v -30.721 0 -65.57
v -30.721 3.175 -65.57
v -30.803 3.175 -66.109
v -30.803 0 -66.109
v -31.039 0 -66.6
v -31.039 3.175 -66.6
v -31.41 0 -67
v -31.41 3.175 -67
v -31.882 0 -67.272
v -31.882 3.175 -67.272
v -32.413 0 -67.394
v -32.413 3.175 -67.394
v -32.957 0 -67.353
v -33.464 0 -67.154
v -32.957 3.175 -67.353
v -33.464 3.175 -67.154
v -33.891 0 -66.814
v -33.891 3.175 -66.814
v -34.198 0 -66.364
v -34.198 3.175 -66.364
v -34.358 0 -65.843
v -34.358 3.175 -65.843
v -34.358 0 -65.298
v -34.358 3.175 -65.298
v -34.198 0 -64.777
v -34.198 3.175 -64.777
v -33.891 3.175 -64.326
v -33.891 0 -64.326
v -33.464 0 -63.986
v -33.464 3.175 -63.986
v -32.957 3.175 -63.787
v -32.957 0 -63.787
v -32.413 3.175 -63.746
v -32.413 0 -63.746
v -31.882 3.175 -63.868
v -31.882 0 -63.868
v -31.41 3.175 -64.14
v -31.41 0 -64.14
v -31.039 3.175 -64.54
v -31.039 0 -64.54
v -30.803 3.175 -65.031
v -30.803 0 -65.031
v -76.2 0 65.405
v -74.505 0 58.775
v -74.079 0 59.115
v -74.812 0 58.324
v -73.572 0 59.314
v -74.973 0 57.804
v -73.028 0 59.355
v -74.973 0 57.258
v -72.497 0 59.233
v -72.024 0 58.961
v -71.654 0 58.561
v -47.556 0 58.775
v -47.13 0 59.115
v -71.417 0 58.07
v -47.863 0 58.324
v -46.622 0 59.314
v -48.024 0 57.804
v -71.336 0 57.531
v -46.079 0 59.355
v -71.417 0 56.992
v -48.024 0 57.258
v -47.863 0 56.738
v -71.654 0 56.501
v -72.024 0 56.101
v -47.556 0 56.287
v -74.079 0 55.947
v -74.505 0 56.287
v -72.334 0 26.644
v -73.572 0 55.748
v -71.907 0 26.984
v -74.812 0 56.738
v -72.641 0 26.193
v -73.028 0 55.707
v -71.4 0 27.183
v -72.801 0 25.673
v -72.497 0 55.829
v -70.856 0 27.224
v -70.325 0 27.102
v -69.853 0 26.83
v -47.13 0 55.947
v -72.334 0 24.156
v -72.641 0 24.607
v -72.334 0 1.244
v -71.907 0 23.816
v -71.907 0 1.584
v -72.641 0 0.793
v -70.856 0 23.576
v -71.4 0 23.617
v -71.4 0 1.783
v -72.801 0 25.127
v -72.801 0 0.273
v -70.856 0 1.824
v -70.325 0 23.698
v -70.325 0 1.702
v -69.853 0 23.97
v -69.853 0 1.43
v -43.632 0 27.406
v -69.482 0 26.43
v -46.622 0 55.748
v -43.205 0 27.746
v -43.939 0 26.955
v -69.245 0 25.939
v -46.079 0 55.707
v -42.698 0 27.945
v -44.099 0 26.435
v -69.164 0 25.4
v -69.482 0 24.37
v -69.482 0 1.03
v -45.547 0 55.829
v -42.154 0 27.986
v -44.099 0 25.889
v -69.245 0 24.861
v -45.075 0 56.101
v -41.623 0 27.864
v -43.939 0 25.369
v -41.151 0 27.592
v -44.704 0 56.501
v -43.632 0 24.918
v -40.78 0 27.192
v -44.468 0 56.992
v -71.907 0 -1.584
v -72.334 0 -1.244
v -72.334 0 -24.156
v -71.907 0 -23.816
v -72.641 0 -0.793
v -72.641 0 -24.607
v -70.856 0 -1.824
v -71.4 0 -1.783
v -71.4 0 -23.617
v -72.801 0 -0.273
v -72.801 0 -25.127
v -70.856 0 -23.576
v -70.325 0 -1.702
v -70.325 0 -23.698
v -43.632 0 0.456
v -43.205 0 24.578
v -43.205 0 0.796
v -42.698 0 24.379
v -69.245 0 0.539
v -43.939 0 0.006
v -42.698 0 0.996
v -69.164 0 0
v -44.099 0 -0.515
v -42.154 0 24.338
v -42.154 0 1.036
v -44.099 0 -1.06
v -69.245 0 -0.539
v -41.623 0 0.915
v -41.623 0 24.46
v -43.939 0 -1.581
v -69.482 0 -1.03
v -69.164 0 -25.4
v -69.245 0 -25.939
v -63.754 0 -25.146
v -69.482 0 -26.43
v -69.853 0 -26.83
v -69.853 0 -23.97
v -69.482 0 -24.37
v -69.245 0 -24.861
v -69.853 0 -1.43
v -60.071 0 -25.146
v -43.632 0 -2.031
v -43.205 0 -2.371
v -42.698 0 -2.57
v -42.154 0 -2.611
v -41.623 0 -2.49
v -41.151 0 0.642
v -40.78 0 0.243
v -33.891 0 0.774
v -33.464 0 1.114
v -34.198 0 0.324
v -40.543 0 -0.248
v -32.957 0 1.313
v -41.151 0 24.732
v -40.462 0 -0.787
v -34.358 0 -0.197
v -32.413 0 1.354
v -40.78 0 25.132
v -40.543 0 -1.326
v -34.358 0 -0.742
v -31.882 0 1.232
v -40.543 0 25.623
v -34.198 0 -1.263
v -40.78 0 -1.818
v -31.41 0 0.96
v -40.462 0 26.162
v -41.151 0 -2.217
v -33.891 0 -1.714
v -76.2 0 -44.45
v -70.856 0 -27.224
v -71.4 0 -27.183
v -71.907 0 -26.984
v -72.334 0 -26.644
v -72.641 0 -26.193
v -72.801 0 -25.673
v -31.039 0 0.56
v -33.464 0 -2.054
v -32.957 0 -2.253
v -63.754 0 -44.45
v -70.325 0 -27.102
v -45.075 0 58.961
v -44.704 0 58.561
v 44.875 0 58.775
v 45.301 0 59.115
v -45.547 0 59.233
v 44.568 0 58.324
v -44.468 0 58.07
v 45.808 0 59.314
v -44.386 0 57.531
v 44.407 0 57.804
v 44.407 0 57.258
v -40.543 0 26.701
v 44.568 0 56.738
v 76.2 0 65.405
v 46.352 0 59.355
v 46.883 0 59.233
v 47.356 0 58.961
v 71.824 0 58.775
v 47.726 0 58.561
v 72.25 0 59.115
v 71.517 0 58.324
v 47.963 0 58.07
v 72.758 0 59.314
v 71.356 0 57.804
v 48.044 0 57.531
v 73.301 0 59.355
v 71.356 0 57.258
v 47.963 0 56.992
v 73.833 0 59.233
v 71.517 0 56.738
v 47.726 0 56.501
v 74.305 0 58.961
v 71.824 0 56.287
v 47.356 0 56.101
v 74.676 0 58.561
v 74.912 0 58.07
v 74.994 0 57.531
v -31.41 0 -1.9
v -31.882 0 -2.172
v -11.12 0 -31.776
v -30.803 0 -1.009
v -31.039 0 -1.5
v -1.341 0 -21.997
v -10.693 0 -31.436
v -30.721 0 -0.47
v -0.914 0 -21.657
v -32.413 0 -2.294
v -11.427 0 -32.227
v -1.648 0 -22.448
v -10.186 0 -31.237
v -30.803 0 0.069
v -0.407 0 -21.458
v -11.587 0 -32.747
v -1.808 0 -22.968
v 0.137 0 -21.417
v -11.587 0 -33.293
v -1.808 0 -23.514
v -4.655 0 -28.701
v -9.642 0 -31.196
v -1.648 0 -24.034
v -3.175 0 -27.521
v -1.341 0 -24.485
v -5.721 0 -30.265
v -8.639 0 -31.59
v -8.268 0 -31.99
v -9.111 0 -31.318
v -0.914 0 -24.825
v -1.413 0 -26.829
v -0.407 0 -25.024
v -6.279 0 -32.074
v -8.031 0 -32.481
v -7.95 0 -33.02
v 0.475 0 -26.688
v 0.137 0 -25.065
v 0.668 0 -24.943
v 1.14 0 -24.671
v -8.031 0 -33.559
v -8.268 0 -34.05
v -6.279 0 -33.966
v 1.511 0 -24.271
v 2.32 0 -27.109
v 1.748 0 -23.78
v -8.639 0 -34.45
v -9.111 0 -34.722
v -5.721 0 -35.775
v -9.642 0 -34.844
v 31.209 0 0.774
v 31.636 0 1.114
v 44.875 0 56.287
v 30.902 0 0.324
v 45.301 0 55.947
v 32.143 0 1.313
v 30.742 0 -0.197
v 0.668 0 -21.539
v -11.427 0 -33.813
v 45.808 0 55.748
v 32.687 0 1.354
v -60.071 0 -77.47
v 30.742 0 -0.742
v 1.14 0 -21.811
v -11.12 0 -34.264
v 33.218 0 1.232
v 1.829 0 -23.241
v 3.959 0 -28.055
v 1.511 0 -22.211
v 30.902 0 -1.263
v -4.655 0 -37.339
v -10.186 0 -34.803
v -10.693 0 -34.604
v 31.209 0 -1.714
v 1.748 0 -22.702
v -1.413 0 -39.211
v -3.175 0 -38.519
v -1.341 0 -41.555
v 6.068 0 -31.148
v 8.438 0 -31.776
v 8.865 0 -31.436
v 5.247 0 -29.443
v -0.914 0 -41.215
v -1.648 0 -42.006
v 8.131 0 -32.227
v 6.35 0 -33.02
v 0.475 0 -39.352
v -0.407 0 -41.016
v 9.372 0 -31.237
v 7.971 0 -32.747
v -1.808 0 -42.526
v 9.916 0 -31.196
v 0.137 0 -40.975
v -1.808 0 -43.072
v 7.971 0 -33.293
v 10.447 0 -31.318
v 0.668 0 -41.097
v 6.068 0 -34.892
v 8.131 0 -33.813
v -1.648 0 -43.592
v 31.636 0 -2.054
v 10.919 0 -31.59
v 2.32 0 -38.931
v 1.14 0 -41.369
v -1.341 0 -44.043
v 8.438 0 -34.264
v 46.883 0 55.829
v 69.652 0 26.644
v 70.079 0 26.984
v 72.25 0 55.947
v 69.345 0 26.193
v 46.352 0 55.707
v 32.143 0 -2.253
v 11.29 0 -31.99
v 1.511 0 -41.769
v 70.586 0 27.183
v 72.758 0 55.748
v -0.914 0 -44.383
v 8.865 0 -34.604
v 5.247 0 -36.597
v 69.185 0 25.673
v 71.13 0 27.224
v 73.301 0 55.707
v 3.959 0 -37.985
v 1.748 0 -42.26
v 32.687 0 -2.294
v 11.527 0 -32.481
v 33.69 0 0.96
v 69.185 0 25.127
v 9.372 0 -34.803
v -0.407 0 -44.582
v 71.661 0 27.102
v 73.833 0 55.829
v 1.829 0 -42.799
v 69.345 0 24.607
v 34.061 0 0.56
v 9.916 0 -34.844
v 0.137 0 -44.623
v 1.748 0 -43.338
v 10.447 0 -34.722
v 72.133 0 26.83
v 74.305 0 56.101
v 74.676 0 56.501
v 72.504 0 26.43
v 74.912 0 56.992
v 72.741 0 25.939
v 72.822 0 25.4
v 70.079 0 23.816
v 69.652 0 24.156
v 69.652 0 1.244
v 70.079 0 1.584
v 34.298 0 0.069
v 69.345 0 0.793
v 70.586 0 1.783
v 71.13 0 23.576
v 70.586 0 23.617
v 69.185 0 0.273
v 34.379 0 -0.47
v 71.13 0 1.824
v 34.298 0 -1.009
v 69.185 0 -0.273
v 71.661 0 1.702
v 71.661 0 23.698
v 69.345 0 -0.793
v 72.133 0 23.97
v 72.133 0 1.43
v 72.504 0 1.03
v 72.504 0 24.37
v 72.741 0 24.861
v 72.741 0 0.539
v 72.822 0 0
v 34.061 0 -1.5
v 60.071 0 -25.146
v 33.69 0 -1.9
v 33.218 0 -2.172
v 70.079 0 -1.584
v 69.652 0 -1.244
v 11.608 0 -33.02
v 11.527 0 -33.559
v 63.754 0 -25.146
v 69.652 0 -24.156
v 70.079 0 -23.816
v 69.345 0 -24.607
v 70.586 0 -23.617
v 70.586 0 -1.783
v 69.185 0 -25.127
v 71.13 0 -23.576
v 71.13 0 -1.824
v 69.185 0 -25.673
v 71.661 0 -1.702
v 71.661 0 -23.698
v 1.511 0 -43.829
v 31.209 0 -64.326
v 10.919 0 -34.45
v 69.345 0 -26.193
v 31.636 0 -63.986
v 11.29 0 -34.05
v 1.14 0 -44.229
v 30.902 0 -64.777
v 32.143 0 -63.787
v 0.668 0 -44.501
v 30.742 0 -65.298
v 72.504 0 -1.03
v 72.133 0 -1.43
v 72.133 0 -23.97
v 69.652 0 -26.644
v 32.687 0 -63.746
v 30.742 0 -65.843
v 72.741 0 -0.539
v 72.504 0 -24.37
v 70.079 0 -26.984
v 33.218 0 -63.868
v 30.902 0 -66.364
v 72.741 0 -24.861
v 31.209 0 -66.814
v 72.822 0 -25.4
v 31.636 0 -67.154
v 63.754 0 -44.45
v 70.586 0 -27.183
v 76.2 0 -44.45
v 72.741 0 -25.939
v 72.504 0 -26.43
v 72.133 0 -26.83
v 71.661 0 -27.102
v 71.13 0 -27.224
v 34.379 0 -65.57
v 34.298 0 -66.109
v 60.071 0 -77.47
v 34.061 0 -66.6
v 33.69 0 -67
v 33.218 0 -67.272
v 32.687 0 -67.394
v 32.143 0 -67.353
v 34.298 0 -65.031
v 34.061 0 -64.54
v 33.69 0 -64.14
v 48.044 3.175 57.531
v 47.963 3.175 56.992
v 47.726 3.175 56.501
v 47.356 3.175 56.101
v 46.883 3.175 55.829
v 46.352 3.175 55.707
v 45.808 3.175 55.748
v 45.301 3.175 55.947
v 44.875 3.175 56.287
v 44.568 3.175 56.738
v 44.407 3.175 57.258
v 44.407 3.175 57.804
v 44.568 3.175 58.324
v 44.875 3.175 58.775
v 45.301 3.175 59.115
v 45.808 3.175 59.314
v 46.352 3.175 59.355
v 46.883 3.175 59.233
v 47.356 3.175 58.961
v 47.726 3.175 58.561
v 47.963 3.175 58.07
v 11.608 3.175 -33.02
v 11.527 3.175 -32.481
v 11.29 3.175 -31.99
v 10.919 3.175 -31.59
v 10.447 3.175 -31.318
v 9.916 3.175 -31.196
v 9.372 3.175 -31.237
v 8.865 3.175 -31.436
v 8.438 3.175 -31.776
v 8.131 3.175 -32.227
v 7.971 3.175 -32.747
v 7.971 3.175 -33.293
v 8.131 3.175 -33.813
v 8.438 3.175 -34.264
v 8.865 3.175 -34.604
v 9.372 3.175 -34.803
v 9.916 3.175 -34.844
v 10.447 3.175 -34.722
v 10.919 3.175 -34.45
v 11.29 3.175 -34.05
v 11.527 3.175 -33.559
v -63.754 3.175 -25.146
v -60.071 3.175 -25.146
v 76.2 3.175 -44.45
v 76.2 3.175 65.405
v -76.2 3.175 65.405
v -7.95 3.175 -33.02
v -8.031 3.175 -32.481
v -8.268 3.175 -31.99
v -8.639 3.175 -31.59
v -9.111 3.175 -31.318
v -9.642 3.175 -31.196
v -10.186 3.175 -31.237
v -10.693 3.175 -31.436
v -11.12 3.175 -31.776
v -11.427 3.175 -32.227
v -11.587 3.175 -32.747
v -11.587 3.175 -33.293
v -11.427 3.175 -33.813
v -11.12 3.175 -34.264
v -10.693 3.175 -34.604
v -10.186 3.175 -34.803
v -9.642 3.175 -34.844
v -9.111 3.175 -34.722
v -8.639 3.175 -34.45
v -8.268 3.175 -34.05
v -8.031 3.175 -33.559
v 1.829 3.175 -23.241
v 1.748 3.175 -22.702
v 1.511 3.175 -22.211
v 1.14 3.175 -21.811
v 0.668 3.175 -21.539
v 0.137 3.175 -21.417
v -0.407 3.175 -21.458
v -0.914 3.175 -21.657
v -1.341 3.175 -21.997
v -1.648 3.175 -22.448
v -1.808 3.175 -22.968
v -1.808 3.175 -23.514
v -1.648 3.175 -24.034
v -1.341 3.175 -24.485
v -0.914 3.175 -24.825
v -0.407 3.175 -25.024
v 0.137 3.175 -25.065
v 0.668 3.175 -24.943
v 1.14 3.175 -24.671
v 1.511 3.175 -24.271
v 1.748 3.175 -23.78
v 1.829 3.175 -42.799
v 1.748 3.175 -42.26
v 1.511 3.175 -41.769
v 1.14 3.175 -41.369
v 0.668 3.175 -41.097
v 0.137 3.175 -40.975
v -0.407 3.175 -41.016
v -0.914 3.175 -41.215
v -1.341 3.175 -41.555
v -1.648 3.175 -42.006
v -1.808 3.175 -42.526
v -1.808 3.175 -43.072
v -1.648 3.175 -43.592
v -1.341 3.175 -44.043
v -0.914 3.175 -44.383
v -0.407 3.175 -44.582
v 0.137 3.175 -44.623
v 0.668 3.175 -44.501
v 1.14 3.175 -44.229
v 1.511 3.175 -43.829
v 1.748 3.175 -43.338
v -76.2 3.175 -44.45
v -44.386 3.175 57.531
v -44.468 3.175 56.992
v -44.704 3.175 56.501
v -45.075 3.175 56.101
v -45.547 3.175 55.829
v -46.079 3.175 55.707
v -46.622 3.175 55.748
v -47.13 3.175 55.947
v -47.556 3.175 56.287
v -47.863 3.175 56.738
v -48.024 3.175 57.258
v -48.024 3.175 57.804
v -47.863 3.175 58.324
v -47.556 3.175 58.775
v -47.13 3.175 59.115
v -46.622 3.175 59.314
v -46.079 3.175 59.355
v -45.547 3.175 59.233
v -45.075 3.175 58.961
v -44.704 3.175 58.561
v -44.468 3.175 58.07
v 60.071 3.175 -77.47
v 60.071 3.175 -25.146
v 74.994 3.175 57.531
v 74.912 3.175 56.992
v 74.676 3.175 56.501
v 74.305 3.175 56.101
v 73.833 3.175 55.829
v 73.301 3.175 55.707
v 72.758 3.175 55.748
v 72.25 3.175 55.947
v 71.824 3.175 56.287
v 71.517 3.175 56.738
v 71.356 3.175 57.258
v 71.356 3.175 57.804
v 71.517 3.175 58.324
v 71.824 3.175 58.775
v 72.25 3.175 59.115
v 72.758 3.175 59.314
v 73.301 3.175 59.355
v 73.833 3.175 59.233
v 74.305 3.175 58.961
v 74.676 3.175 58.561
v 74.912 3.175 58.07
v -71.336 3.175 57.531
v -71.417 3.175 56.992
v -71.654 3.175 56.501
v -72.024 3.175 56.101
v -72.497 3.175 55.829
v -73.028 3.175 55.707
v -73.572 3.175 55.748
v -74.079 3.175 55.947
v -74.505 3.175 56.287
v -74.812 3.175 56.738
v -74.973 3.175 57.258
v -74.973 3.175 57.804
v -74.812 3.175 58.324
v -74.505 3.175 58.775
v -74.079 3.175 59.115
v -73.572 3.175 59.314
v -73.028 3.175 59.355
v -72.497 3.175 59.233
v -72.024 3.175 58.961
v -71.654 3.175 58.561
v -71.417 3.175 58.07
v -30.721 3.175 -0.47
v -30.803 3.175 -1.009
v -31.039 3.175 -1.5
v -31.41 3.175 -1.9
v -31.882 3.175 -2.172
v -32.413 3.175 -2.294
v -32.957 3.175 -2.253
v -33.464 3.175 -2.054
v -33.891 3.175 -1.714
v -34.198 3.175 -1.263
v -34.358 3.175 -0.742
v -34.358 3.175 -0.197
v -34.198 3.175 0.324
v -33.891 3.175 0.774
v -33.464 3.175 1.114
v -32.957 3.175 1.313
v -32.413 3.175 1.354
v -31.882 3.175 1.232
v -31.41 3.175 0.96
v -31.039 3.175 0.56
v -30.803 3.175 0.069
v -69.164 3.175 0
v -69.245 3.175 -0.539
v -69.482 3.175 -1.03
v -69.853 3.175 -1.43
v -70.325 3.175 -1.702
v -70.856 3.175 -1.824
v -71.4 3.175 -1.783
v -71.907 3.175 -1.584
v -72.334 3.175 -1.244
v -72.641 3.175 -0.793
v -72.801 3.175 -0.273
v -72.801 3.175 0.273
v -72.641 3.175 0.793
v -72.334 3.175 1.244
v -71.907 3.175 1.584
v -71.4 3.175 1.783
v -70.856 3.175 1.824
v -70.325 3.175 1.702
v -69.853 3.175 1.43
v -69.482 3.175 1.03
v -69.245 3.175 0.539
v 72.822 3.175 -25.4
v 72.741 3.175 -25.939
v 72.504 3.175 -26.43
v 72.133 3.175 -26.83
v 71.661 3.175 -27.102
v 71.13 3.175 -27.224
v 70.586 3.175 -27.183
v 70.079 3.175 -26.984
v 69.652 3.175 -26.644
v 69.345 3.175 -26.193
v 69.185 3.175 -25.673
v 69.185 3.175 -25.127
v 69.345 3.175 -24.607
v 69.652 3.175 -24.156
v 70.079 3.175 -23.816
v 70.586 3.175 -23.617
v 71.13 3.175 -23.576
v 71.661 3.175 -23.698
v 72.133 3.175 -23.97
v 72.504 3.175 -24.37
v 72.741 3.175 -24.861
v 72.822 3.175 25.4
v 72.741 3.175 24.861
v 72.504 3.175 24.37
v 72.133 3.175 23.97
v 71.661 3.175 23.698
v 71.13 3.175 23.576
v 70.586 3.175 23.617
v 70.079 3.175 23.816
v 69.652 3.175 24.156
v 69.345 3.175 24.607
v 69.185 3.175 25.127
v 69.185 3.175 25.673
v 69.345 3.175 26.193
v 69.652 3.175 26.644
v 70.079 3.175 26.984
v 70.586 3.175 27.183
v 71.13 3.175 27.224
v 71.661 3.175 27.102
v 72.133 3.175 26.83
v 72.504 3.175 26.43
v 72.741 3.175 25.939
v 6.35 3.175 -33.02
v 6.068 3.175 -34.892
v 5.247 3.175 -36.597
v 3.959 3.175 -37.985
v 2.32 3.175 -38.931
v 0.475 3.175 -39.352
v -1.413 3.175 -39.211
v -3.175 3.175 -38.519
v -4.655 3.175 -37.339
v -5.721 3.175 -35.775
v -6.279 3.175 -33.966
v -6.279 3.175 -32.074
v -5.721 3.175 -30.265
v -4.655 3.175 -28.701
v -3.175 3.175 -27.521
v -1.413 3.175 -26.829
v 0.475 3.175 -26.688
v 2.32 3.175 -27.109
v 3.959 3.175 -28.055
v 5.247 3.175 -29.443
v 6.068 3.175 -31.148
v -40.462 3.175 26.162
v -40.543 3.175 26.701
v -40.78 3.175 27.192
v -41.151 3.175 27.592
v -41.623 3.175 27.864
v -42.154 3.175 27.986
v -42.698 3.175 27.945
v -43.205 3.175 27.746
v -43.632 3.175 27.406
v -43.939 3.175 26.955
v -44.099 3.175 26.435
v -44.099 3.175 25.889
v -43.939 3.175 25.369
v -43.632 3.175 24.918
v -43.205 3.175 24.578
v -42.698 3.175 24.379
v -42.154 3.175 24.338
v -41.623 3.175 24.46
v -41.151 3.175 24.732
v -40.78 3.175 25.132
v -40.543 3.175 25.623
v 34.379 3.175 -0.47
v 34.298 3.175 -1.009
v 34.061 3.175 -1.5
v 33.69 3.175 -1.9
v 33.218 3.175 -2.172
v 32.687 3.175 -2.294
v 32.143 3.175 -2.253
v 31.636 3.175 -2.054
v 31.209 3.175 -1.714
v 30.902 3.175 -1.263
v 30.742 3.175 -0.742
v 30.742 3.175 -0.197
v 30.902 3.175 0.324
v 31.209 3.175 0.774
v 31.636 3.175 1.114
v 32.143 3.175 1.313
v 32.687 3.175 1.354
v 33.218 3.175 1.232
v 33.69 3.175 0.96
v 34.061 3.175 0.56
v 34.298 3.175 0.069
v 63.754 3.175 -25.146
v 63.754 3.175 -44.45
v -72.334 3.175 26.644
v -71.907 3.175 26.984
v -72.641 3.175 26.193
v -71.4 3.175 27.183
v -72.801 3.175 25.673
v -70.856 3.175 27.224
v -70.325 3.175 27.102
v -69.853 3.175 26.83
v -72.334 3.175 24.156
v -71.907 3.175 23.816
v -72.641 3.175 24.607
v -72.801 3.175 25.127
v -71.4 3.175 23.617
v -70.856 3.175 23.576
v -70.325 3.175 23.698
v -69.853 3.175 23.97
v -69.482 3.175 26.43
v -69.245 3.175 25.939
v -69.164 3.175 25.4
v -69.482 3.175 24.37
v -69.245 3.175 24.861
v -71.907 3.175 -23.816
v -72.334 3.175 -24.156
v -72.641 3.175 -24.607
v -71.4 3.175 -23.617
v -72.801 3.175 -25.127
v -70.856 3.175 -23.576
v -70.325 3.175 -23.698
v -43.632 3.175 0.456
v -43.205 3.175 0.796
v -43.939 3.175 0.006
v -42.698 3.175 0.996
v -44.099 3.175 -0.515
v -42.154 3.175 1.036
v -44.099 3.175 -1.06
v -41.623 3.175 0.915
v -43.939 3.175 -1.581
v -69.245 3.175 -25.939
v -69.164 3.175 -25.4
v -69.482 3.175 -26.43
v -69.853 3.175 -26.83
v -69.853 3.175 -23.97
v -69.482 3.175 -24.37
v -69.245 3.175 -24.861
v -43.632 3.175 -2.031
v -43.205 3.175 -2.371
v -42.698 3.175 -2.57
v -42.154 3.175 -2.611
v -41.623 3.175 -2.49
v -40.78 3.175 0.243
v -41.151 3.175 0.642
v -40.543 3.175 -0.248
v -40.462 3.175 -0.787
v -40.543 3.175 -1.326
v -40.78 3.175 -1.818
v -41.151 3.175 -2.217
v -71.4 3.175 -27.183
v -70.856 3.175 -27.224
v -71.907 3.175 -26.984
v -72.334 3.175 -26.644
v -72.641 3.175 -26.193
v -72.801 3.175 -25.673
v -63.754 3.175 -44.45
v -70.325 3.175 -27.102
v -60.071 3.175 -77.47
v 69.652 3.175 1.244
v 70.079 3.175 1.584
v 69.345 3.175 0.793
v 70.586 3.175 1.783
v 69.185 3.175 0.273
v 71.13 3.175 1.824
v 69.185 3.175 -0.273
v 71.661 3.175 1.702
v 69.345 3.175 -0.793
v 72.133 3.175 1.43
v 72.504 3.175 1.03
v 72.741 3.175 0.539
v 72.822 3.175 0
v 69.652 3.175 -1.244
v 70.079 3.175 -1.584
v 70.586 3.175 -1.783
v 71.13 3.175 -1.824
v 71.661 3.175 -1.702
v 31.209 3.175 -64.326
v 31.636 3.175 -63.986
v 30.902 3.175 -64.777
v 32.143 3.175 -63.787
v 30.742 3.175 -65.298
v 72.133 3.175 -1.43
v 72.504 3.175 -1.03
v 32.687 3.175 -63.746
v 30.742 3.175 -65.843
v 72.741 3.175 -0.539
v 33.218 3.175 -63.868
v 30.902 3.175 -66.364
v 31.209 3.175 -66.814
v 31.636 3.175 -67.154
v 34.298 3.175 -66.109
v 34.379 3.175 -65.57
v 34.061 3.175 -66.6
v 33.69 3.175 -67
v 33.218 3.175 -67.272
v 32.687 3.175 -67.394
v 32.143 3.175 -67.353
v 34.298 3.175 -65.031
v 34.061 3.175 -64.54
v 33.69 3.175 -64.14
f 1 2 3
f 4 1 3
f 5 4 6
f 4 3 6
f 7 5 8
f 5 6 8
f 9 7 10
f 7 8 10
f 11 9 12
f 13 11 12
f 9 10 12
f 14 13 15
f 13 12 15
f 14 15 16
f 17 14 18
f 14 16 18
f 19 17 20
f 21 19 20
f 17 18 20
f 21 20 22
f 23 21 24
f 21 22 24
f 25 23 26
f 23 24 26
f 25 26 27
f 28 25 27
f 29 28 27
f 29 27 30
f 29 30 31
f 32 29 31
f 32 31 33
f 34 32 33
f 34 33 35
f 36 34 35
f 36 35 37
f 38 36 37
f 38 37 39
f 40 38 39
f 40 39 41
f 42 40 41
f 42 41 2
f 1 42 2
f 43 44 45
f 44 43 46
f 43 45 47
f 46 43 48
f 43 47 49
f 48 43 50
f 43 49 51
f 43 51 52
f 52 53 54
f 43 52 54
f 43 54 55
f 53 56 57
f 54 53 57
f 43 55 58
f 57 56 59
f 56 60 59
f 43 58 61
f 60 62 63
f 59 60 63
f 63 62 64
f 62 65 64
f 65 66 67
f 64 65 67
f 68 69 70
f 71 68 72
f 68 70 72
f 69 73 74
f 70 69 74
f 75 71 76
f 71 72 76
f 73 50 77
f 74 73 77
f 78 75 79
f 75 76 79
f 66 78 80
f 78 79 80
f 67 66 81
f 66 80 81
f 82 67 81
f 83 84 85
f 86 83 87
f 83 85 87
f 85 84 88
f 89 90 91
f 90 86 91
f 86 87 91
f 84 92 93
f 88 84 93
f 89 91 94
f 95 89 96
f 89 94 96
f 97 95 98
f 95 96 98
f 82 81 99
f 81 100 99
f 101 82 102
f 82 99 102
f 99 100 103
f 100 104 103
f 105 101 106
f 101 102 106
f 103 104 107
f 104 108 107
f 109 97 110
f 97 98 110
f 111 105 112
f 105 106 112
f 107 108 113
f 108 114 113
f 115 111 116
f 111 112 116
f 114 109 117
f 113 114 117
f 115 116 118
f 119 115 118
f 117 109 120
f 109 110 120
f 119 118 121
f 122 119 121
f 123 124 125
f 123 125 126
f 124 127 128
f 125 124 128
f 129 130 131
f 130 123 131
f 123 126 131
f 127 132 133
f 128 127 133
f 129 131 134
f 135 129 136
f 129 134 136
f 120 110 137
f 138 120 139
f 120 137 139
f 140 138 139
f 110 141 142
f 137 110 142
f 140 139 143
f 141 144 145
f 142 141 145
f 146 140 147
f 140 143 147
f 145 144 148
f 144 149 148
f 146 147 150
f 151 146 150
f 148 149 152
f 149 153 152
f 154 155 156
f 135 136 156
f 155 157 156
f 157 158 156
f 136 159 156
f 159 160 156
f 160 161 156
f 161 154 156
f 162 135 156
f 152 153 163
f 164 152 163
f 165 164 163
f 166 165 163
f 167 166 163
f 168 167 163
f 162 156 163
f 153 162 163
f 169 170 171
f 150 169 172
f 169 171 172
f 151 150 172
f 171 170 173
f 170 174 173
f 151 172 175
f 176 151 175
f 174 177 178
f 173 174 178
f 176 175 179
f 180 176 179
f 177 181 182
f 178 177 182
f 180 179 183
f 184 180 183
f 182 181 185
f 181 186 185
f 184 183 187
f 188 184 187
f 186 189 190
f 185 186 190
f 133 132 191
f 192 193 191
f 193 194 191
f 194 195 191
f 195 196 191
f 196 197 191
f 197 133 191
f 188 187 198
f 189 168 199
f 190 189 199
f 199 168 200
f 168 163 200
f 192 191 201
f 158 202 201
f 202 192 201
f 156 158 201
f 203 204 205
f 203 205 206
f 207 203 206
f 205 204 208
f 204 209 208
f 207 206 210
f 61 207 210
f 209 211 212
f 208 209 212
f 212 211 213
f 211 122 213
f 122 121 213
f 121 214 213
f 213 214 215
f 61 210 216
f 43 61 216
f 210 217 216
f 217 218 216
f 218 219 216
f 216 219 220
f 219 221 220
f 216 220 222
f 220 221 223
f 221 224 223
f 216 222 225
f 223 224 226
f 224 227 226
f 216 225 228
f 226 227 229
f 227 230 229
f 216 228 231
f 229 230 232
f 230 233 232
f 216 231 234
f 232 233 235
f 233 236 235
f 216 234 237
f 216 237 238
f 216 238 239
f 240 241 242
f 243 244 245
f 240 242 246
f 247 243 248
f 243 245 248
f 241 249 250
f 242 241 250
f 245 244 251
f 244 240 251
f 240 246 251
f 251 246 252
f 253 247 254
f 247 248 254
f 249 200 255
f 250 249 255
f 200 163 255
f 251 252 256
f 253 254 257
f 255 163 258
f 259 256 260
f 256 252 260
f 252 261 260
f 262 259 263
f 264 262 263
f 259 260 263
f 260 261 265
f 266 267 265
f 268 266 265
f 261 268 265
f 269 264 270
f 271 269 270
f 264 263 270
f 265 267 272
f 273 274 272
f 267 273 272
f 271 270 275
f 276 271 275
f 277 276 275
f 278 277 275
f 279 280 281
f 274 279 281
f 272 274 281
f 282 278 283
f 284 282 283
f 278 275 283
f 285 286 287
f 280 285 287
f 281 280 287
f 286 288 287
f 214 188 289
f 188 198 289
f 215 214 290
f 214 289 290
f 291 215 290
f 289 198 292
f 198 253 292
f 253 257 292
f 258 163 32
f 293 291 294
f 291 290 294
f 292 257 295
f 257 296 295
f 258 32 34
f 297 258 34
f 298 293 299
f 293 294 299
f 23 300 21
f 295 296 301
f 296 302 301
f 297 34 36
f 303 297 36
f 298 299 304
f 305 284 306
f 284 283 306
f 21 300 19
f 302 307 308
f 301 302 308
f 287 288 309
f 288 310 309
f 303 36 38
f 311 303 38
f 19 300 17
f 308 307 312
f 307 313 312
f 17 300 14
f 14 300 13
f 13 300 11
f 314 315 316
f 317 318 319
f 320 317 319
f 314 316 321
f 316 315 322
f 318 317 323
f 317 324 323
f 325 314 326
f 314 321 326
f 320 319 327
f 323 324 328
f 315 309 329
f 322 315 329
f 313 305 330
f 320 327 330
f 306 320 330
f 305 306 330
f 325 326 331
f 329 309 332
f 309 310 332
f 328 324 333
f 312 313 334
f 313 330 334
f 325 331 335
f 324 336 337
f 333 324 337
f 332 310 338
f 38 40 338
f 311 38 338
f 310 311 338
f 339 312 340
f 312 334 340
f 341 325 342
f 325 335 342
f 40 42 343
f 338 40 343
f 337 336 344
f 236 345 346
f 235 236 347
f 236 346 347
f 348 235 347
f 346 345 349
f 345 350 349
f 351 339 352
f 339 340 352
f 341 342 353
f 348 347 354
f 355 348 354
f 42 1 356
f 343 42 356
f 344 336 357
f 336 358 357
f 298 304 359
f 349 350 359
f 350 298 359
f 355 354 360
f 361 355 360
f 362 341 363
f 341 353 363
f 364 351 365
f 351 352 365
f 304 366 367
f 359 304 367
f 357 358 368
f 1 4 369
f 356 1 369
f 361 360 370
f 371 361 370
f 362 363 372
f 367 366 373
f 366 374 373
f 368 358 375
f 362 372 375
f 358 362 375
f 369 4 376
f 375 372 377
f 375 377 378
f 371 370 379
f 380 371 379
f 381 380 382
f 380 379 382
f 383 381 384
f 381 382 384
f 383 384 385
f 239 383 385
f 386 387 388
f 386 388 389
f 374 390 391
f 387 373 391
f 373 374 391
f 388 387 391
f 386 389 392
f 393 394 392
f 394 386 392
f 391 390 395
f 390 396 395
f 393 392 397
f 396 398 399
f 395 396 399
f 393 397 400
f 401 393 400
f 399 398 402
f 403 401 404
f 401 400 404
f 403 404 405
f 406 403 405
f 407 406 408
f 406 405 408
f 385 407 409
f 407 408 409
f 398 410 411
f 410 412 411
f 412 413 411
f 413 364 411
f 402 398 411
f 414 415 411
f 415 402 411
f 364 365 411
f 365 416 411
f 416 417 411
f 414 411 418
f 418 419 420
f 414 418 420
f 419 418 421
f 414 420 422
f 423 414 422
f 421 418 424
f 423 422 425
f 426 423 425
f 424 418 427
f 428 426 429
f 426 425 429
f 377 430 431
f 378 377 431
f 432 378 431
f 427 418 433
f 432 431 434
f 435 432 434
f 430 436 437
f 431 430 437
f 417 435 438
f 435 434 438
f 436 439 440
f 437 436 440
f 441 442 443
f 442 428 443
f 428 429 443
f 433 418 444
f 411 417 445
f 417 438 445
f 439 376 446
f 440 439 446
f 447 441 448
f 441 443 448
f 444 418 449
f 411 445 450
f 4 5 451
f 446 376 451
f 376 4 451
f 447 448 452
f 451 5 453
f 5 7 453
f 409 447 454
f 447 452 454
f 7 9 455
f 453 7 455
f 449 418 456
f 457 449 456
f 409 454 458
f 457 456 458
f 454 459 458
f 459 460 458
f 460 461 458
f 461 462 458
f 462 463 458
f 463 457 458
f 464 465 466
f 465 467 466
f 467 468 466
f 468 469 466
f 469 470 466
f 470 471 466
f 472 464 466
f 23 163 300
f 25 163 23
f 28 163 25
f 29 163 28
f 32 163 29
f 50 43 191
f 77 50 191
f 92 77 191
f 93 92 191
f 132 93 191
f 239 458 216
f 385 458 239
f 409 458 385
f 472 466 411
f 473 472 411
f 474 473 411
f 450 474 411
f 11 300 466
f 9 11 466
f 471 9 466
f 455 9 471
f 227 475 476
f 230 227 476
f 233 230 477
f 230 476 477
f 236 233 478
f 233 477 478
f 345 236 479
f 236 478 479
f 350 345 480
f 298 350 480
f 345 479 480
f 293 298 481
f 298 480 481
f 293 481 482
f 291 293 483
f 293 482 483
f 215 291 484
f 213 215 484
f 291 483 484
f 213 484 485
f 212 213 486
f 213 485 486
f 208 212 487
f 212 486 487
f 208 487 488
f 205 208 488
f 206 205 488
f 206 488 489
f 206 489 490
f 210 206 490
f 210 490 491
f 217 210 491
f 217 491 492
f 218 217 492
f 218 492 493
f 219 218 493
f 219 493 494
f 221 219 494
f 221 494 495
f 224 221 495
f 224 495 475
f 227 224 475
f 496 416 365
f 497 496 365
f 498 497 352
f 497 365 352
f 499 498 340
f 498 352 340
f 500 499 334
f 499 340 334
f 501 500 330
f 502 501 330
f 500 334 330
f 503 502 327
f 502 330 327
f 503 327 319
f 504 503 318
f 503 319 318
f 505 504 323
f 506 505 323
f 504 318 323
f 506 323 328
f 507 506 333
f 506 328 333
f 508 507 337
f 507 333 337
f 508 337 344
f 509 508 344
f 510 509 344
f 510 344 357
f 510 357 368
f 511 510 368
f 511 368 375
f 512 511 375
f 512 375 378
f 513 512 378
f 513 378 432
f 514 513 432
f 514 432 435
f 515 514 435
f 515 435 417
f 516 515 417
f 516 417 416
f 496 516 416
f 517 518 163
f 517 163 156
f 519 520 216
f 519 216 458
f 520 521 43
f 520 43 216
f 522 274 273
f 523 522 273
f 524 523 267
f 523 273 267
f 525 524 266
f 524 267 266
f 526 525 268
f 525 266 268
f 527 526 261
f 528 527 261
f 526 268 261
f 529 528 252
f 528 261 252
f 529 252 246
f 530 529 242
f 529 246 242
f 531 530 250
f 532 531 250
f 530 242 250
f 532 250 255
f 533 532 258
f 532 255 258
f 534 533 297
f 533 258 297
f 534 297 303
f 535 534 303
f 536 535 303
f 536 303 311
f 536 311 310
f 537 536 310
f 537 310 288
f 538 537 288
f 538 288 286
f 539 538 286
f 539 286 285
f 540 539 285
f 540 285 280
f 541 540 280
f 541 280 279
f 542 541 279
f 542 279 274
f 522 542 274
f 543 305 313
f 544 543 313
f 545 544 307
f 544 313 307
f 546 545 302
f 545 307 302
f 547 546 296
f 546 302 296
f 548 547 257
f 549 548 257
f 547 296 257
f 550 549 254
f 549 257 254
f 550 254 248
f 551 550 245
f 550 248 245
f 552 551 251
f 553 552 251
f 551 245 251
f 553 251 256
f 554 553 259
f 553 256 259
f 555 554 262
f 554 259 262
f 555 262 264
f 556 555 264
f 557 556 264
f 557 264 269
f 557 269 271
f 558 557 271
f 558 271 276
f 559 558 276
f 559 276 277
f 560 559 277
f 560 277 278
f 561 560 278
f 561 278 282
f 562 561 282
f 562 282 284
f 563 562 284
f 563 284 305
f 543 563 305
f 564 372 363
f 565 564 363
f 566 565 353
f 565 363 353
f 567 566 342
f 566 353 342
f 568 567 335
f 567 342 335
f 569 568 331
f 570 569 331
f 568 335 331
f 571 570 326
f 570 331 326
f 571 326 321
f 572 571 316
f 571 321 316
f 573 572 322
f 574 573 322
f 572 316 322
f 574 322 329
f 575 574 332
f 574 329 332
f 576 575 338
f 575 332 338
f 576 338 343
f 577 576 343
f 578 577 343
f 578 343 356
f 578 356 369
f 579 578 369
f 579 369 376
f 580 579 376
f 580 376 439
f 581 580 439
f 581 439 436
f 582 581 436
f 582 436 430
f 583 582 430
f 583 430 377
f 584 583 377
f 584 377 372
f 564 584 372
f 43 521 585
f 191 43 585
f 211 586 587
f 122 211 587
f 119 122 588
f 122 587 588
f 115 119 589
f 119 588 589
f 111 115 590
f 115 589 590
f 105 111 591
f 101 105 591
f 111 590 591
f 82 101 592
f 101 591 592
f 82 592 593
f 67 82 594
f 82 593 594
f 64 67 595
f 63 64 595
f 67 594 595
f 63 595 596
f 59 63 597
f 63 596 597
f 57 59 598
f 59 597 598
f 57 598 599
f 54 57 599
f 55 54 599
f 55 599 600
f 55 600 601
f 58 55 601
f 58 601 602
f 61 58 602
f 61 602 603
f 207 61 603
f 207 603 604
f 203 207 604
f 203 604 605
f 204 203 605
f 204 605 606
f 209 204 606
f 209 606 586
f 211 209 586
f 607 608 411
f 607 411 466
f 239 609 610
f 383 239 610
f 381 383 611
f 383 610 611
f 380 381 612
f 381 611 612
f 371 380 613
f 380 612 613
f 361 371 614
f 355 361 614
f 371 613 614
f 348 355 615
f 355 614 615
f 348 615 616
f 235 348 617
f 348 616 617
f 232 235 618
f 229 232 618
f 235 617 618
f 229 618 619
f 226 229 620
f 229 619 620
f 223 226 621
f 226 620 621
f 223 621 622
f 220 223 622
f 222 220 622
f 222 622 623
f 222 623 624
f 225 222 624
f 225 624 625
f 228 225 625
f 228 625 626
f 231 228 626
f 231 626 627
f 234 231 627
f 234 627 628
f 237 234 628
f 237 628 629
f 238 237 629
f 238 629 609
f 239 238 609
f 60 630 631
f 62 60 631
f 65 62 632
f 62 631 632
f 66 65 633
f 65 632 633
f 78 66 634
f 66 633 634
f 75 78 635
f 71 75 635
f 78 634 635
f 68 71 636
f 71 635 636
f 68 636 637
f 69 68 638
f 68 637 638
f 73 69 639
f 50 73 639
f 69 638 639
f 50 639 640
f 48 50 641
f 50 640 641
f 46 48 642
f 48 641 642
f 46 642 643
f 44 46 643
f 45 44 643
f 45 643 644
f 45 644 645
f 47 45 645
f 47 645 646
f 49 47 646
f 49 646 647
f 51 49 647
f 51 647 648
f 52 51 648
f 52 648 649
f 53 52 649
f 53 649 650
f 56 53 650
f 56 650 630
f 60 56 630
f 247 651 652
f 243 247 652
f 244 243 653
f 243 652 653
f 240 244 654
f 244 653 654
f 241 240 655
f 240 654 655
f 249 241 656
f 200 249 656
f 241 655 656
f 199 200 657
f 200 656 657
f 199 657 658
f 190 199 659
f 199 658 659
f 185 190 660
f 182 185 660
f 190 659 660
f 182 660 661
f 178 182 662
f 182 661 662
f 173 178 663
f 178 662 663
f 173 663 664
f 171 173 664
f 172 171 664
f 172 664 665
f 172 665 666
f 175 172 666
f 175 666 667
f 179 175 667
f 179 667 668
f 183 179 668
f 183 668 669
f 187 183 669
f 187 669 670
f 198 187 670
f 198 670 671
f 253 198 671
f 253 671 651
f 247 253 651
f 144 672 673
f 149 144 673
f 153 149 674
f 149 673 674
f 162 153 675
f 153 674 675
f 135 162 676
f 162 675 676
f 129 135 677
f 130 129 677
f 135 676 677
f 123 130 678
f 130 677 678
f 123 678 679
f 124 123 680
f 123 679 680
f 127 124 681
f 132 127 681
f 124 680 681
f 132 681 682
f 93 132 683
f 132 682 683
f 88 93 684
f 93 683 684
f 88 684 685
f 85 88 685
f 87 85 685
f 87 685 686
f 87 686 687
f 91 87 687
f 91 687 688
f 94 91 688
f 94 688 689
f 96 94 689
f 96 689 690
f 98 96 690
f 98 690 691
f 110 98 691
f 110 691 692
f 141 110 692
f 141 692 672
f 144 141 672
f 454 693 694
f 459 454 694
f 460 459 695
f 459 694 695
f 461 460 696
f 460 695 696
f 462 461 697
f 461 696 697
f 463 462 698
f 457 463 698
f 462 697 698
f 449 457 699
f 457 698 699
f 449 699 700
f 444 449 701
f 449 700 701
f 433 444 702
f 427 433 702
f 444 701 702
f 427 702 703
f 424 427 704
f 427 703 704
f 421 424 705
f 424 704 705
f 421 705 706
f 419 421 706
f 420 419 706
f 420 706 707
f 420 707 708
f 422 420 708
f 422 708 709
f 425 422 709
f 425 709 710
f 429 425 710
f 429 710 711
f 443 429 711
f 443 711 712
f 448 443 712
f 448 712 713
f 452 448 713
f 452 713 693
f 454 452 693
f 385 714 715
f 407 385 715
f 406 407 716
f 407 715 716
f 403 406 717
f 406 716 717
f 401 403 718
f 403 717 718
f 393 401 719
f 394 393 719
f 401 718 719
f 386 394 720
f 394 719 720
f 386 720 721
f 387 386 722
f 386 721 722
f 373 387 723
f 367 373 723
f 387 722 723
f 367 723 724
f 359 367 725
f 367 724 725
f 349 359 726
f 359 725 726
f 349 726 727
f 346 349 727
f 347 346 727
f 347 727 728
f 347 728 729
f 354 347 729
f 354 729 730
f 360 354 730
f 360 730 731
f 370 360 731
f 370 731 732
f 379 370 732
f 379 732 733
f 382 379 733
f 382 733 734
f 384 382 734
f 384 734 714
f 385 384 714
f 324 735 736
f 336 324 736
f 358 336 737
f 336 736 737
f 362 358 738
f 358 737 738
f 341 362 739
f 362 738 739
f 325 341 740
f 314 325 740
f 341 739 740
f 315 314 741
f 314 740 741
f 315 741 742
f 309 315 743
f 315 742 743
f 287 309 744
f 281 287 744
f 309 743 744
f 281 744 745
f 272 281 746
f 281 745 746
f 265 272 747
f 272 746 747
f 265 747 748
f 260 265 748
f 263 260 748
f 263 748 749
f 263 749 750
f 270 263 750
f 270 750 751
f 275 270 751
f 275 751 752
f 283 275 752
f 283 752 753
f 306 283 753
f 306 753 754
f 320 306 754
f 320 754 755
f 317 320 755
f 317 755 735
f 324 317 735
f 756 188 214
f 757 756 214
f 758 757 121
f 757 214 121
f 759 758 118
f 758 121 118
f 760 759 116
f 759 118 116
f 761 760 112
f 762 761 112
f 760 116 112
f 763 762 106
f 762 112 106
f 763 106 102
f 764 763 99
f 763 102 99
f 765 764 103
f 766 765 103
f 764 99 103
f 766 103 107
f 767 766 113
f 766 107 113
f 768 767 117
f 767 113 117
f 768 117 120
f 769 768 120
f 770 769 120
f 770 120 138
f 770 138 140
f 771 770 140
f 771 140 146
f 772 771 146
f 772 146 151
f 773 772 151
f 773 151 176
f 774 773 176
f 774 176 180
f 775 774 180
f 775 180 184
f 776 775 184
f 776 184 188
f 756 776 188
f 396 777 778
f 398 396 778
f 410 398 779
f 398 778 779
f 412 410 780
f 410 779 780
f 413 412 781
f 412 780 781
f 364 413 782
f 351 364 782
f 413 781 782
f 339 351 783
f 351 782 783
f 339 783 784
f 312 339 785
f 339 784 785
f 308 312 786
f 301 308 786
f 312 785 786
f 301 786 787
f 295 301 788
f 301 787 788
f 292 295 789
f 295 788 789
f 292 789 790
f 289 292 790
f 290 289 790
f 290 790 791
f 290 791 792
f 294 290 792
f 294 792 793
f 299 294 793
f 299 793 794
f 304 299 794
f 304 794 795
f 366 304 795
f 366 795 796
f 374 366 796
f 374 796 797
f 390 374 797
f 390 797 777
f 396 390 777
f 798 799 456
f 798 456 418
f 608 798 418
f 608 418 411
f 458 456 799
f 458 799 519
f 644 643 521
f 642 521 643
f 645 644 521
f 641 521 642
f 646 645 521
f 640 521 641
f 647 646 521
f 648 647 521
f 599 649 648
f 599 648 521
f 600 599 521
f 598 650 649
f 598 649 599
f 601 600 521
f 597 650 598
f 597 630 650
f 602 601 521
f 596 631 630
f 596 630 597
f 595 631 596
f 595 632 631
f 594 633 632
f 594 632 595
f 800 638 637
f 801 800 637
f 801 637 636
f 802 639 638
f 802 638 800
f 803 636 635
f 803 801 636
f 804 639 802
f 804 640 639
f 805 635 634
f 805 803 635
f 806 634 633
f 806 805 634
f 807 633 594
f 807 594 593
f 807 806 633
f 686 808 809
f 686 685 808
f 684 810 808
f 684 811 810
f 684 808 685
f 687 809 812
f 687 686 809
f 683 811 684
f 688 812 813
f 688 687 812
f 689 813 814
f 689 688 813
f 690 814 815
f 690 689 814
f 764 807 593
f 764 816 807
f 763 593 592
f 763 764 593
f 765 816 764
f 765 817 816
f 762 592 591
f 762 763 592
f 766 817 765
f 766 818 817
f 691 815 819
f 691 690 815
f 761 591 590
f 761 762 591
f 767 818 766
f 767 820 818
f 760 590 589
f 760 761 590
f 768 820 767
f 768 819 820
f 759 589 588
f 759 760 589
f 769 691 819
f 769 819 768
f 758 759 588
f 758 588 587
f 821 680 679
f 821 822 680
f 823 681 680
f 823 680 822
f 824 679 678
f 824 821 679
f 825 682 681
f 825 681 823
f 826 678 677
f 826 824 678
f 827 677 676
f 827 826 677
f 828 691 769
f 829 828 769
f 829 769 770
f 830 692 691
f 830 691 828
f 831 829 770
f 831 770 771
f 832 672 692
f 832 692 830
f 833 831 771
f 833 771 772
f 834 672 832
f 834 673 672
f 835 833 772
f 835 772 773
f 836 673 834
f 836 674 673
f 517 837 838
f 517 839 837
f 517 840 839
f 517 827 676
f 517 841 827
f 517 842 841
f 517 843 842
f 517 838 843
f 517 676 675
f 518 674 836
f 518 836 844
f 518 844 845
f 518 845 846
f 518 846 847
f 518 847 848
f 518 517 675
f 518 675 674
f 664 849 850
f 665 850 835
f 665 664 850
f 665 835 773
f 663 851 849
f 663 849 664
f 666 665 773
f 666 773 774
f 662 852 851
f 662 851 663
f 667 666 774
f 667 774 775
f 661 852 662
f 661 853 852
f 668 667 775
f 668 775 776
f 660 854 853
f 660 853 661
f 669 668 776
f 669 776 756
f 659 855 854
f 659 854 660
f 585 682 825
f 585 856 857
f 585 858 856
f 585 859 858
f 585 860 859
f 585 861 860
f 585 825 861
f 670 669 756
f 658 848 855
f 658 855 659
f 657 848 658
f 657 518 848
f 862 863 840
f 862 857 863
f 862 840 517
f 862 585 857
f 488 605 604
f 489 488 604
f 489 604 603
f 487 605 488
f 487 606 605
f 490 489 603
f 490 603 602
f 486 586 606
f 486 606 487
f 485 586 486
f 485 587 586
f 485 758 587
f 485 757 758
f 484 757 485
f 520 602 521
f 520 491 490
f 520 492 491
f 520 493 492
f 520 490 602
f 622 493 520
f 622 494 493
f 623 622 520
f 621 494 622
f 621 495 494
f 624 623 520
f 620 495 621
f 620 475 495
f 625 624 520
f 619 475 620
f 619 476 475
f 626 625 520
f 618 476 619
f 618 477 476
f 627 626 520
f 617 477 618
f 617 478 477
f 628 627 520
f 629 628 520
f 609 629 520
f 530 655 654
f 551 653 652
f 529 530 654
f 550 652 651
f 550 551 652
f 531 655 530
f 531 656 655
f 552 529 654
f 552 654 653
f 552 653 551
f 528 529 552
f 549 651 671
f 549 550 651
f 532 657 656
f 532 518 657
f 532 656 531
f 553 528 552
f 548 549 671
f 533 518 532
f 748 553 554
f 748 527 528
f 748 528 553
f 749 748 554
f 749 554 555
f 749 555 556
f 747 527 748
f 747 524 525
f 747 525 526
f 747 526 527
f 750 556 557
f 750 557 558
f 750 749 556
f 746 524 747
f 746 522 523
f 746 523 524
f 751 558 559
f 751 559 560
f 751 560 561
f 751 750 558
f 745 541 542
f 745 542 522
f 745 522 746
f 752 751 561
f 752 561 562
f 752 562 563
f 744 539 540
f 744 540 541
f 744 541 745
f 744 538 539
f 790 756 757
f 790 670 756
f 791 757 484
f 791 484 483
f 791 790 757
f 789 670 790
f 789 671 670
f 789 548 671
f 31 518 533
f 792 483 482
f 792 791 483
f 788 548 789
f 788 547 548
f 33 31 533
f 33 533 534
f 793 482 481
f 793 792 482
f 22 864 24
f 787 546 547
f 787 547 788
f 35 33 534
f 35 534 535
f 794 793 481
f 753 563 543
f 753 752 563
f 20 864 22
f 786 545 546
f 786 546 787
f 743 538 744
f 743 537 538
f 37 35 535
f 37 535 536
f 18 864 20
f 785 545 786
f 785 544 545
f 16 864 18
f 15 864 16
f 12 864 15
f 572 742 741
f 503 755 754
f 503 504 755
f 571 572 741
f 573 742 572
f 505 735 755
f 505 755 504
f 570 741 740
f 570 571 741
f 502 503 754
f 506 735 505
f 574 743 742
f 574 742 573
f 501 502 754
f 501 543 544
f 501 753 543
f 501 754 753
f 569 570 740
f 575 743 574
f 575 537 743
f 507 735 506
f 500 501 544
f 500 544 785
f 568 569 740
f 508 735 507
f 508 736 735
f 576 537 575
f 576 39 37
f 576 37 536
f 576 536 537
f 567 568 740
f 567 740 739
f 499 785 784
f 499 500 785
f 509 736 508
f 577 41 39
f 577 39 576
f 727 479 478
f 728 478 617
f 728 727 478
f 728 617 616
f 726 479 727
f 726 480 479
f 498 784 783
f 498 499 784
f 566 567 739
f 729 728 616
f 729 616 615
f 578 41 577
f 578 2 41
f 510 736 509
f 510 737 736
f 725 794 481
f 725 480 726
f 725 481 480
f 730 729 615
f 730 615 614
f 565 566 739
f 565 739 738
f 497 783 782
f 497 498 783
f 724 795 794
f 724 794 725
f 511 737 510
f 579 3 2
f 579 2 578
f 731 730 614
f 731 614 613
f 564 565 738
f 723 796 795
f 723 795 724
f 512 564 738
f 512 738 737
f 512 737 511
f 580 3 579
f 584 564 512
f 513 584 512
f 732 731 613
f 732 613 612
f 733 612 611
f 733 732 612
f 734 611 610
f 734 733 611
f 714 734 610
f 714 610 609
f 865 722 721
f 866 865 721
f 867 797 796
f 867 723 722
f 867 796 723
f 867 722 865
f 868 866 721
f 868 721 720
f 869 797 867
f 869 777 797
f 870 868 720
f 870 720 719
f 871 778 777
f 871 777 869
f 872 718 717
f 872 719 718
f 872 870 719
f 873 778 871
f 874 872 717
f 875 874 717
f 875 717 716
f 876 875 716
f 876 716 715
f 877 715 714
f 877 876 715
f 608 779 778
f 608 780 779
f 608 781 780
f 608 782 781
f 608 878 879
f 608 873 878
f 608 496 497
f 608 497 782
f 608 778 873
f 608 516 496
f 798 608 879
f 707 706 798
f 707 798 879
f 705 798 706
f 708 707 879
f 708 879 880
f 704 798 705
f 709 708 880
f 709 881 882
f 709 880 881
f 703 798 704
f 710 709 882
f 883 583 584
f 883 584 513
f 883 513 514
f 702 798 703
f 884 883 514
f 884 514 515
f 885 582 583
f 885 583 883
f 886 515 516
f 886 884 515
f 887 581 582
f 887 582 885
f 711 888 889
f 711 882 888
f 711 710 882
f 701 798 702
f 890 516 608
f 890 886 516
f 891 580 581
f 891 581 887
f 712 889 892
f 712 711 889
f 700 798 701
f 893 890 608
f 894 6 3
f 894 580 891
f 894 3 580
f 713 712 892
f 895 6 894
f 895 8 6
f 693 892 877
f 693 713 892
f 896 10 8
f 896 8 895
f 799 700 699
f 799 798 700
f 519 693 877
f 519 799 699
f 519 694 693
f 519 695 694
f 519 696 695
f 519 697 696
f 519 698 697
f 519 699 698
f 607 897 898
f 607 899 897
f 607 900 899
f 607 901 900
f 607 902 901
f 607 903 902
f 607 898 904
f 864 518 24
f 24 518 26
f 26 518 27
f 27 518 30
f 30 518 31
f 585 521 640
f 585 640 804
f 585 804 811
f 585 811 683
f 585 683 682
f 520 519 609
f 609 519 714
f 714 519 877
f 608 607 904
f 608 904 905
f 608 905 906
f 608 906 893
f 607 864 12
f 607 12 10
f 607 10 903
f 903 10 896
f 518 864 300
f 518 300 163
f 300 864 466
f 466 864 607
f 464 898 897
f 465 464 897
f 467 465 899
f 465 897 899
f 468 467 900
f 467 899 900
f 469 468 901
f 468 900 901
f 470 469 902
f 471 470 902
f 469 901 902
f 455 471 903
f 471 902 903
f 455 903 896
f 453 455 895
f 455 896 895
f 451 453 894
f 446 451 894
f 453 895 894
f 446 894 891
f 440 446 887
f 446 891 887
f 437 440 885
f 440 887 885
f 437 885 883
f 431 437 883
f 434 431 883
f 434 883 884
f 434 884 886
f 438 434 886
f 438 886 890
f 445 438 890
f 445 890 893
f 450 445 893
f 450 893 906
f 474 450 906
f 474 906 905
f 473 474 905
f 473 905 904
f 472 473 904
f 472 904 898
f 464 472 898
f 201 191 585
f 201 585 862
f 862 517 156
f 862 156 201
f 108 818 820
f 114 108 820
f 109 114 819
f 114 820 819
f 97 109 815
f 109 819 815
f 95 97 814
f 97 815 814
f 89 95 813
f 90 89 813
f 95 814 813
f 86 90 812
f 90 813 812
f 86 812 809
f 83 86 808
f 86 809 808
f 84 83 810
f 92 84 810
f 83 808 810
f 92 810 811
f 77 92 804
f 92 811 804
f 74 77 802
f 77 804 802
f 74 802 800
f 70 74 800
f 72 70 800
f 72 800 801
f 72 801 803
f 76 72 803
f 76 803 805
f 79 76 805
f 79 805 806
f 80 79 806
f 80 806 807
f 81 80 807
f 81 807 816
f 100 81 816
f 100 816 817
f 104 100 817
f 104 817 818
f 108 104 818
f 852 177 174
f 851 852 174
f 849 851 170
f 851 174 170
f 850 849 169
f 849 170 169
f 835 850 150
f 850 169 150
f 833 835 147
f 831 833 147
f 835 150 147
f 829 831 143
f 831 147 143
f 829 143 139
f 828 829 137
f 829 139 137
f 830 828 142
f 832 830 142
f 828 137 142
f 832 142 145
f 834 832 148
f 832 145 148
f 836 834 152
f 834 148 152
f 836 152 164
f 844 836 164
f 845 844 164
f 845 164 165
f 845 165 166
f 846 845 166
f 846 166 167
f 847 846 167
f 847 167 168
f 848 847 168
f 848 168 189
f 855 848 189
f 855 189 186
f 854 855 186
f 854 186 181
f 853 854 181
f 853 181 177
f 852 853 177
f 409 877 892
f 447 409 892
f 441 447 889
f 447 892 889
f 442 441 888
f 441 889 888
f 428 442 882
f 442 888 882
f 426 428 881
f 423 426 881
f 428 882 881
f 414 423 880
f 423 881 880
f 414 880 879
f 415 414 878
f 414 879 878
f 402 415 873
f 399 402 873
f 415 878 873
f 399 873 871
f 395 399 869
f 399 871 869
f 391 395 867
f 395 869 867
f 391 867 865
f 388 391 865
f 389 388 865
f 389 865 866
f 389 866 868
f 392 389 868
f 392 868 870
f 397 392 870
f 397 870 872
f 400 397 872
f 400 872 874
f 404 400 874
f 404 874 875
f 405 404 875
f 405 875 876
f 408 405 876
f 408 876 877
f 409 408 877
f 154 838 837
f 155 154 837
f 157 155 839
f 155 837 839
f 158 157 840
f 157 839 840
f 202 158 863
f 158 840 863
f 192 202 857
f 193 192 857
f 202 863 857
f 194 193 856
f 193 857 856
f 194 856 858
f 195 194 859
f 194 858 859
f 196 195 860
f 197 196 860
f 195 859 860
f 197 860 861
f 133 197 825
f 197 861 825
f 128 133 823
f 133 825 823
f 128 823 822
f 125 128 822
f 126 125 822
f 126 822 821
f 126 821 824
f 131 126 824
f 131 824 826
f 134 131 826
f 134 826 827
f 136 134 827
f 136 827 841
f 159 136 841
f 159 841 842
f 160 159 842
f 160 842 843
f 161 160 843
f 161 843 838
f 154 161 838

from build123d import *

# Parameters (mm, degrees)
SKETCH1_W           = 152.4
SKETCH1_H           = 88.9
BOSS_EXTRUDE1_DEPTH = 3.175
SKETCH2_W           = 3.175
SKETCH2_H           = 44.45
CUT_EXTRUDE1_DEPTH  = 4.175
SKETCH3_R           = 1.8288
CUT_EXTRUDE2_DEPTH  = 4.175
SKETCH6_W           = 3.175
SKETCH6_H           = 25.4
BOSS_EXTRUDE2_DEPTH = 3.175
CUT_EXTRUDE3_DEPTH  = 4.175
CUT_EXTRUDE4_DEPTH  = 4.175
SKETCH9_W           = 152.4
SKETCH9_H           = 20.955
BOSS_EXTRUDE3_DEPTH = 3.175
SKETCH10_R          = 1.8288
CUT_EXTRUDE5_DEPTH  = 4.175
SKETCH11_W          = 120.142
SKETCH11_H          = 88.9
BOSS_EXTRUDE4_DEPTH = 3.175
SKETCH12_R          = 6.35
CUT_EXTRUDE6_DEPTH  = 4.175
SKETCH13_R          = 1.8288
CUT_EXTRUDE7_DEPTH  = 4.175
SKETCH14_R          = 1.8288
CUT_EXTRUDE8_DEPTH  = 101.6
SKETCH15_R          = 1.8288
CUT_EXTRUDE9_DEPTH  = 4.175


with BuildPart() as part:
    # Sketch1 → Boss-Extrude1 (new body)
    with BuildSketch(Plane(origin=(0, 0, 0), x_dir=(1, 0, 0), z_dir=(0, 1, 0))):
        Rectangle(SKETCH1_W, SKETCH1_H)
    extrude(amount=BOSS_EXTRUDE1_DEPTH)

    # Sketch2 → Cut-Extrude1 (cut, through all)
    with BuildSketch(Plane(origin=(0, 3.175, 0), x_dir=(1, 0, 0), z_dir=(0, 1, 0))):
        with Locations((61.9125, 22.225)):
            Rectangle(SKETCH2_W, SKETCH2_H)
        with Locations((-61.9125, 22.225)):
            Rectangle(SKETCH2_W, SKETCH2_H)
    extrude(amount=-CUT_EXTRUDE1_DEPTH, mode=Mode.SUBTRACT)

    # Sketch3 → Cut-Extrude2 (cut, through all)
    with BuildSketch(Plane(origin=(0, 3.175, 0), x_dir=(1, 0, 0), z_dir=(0, 1, 0))):
        with Locations((-70.993, -25.4)):
            Circle(SKETCH3_R)
        with Locations((-70.993, 0)):
            Circle(SKETCH3_R)
        with Locations((-70.993, 25.4)):
            Circle(SKETCH3_R)
        with Locations((70.993, -25.4)):
            Circle(SKETCH3_R)
        with Locations((70.993, 0)):
            Circle(SKETCH3_R)
        with Locations((70.993, 25.4)):
            Circle(SKETCH3_R)
    extrude(amount=-CUT_EXTRUDE2_DEPTH, mode=Mode.SUBTRACT)

    # Sketch6 → Boss-Extrude2 (add)
    with BuildSketch(Plane(origin=(0, 3.175, 0), x_dir=(1, 0, 0), z_dir=(0, 1, 0))):
        with Locations((-61.9125, 12.7)):
            Rectangle(SKETCH6_W, SKETCH6_H)
        with Locations((61.9125, 12.7)):
            Rectangle(SKETCH6_W, SKETCH6_H)
    extrude(amount=-BOSS_EXTRUDE2_DEPTH)

    # Sketch7 → Cut-Extrude3 (cut, through all)
    with BuildSketch(Plane(origin=(0, 3.175, 0), x_dir=(1, 0, 0), z_dir=(0, 1, 0))):
        Polygon((-63.754, 44.45), (-63.5, 44.45), (-63.5, 25.4), (-60.325, 25.4), (-60.325, 44.45), (-60.071, 44.45), (-60.071, 25.146), (-63.754, 25.146), align=None)
    extrude(amount=-CUT_EXTRUDE3_DEPTH, mode=Mode.SUBTRACT)

    # Sketch8 → Cut-Extrude4 (cut, through all)
    with BuildSketch(Plane(origin=(0, 3.175, 0), x_dir=(1, 0, 0), z_dir=(0, 1, 0))):
        Polygon((60.071, 44.45), (60.325, 44.45), (60.325, 25.4), (63.5, 25.4), (63.5, 44.45), (63.754, 44.45), (63.754, 25.146), (60.071, 25.146), align=None)
    extrude(amount=-CUT_EXTRUDE4_DEPTH, mode=Mode.SUBTRACT)

    # Sketch9 → Boss-Extrude3 (add)
    with BuildSketch(Plane(origin=(0, 3.175, 0), x_dir=(1, 0, 0), z_dir=(0, 1, 0))):
        with Locations((0, -54.9275)):
            Rectangle(SKETCH9_W, SKETCH9_H)
    extrude(amount=-BOSS_EXTRUDE3_DEPTH)

    # Sketch10 → Cut-Extrude5 (cut, through all)
    with BuildSketch(Plane(origin=(0, 3.175, 0), x_dir=(1, 0, 0), z_dir=(0, 1, 0))):
        with Locations((-73.1647, -57.531)):
            Circle(SKETCH10_R)
        with Locations((-46.2153, -57.531)):
            Circle(SKETCH10_R)
        with Locations((46.2153, -57.531)):
            Circle(SKETCH10_R)
        with Locations((73.1647, -57.531)):
            Circle(SKETCH10_R)
    extrude(amount=-CUT_EXTRUDE5_DEPTH, mode=Mode.SUBTRACT)

    # Sketch11 → Boss-Extrude4 (add)
    with BuildSketch(Plane(origin=(0, 3.175, 0), x_dir=(1, 0, 0), z_dir=(0, 1, 0))):
        with Locations((0, 33.02)):
            Rectangle(SKETCH11_W, SKETCH11_H)
    extrude(amount=-BOSS_EXTRUDE4_DEPTH)

    # Sketch12 → Cut-Extrude6 (cut, through all)
    with BuildSketch(Plane(origin=(0, 3.175, 0), x_dir=(1, 0, 0), z_dir=(0, 1, 0))):
        with Locations((0, 33.02)):
            Circle(SKETCH12_R)
    extrude(amount=-CUT_EXTRUDE6_DEPTH, mode=Mode.SUBTRACT)

    # Sketch13 → Cut-Extrude7 (cut, through all)
    with BuildSketch(Plane(origin=(0, 3.175, 0), x_dir=(1, 0, 0), z_dir=(0, 1, 0))):
        with Locations((32.5501, 0.4699)):
            Circle(SKETCH13_R)
        with Locations((-32.5501, 0.4699)):
            Circle(SKETCH13_R)
        with Locations((-32.5501, 65.5701)):
            Circle(SKETCH13_R)
        with Locations((32.5501, 65.5701)):
            Circle(SKETCH13_R)
    extrude(amount=-CUT_EXTRUDE7_DEPTH, mode=Mode.SUBTRACT)

    # Sketch14 → Cut-Extrude8 (cut)
    with BuildSketch(Plane.XZ):
        with Locations((0, -23.241)):
            Circle(SKETCH14_R)
        with Locations((-9.779, -33.02)):
            Circle(SKETCH14_R)
        with Locations((0, -42.799)):
            Circle(SKETCH14_R)
        with Locations((9.779, -33.02)):
            Circle(SKETCH14_R)
    extrude(amount=-CUT_EXTRUDE8_DEPTH, mode=Mode.SUBTRACT)

    # Sketch15 → Cut-Extrude9 (cut, through all)
    with BuildSketch(Plane.XZ):
        with Locations((-42.291, 26.162)):
            Circle(SKETCH15_R)
        with Locations((-42.291, -0.7874)):
            Circle(SKETCH15_R)
    extrude(amount=-CUT_EXTRUDE9_DEPTH, mode=Mode.SUBTRACT)


solid = part.part
